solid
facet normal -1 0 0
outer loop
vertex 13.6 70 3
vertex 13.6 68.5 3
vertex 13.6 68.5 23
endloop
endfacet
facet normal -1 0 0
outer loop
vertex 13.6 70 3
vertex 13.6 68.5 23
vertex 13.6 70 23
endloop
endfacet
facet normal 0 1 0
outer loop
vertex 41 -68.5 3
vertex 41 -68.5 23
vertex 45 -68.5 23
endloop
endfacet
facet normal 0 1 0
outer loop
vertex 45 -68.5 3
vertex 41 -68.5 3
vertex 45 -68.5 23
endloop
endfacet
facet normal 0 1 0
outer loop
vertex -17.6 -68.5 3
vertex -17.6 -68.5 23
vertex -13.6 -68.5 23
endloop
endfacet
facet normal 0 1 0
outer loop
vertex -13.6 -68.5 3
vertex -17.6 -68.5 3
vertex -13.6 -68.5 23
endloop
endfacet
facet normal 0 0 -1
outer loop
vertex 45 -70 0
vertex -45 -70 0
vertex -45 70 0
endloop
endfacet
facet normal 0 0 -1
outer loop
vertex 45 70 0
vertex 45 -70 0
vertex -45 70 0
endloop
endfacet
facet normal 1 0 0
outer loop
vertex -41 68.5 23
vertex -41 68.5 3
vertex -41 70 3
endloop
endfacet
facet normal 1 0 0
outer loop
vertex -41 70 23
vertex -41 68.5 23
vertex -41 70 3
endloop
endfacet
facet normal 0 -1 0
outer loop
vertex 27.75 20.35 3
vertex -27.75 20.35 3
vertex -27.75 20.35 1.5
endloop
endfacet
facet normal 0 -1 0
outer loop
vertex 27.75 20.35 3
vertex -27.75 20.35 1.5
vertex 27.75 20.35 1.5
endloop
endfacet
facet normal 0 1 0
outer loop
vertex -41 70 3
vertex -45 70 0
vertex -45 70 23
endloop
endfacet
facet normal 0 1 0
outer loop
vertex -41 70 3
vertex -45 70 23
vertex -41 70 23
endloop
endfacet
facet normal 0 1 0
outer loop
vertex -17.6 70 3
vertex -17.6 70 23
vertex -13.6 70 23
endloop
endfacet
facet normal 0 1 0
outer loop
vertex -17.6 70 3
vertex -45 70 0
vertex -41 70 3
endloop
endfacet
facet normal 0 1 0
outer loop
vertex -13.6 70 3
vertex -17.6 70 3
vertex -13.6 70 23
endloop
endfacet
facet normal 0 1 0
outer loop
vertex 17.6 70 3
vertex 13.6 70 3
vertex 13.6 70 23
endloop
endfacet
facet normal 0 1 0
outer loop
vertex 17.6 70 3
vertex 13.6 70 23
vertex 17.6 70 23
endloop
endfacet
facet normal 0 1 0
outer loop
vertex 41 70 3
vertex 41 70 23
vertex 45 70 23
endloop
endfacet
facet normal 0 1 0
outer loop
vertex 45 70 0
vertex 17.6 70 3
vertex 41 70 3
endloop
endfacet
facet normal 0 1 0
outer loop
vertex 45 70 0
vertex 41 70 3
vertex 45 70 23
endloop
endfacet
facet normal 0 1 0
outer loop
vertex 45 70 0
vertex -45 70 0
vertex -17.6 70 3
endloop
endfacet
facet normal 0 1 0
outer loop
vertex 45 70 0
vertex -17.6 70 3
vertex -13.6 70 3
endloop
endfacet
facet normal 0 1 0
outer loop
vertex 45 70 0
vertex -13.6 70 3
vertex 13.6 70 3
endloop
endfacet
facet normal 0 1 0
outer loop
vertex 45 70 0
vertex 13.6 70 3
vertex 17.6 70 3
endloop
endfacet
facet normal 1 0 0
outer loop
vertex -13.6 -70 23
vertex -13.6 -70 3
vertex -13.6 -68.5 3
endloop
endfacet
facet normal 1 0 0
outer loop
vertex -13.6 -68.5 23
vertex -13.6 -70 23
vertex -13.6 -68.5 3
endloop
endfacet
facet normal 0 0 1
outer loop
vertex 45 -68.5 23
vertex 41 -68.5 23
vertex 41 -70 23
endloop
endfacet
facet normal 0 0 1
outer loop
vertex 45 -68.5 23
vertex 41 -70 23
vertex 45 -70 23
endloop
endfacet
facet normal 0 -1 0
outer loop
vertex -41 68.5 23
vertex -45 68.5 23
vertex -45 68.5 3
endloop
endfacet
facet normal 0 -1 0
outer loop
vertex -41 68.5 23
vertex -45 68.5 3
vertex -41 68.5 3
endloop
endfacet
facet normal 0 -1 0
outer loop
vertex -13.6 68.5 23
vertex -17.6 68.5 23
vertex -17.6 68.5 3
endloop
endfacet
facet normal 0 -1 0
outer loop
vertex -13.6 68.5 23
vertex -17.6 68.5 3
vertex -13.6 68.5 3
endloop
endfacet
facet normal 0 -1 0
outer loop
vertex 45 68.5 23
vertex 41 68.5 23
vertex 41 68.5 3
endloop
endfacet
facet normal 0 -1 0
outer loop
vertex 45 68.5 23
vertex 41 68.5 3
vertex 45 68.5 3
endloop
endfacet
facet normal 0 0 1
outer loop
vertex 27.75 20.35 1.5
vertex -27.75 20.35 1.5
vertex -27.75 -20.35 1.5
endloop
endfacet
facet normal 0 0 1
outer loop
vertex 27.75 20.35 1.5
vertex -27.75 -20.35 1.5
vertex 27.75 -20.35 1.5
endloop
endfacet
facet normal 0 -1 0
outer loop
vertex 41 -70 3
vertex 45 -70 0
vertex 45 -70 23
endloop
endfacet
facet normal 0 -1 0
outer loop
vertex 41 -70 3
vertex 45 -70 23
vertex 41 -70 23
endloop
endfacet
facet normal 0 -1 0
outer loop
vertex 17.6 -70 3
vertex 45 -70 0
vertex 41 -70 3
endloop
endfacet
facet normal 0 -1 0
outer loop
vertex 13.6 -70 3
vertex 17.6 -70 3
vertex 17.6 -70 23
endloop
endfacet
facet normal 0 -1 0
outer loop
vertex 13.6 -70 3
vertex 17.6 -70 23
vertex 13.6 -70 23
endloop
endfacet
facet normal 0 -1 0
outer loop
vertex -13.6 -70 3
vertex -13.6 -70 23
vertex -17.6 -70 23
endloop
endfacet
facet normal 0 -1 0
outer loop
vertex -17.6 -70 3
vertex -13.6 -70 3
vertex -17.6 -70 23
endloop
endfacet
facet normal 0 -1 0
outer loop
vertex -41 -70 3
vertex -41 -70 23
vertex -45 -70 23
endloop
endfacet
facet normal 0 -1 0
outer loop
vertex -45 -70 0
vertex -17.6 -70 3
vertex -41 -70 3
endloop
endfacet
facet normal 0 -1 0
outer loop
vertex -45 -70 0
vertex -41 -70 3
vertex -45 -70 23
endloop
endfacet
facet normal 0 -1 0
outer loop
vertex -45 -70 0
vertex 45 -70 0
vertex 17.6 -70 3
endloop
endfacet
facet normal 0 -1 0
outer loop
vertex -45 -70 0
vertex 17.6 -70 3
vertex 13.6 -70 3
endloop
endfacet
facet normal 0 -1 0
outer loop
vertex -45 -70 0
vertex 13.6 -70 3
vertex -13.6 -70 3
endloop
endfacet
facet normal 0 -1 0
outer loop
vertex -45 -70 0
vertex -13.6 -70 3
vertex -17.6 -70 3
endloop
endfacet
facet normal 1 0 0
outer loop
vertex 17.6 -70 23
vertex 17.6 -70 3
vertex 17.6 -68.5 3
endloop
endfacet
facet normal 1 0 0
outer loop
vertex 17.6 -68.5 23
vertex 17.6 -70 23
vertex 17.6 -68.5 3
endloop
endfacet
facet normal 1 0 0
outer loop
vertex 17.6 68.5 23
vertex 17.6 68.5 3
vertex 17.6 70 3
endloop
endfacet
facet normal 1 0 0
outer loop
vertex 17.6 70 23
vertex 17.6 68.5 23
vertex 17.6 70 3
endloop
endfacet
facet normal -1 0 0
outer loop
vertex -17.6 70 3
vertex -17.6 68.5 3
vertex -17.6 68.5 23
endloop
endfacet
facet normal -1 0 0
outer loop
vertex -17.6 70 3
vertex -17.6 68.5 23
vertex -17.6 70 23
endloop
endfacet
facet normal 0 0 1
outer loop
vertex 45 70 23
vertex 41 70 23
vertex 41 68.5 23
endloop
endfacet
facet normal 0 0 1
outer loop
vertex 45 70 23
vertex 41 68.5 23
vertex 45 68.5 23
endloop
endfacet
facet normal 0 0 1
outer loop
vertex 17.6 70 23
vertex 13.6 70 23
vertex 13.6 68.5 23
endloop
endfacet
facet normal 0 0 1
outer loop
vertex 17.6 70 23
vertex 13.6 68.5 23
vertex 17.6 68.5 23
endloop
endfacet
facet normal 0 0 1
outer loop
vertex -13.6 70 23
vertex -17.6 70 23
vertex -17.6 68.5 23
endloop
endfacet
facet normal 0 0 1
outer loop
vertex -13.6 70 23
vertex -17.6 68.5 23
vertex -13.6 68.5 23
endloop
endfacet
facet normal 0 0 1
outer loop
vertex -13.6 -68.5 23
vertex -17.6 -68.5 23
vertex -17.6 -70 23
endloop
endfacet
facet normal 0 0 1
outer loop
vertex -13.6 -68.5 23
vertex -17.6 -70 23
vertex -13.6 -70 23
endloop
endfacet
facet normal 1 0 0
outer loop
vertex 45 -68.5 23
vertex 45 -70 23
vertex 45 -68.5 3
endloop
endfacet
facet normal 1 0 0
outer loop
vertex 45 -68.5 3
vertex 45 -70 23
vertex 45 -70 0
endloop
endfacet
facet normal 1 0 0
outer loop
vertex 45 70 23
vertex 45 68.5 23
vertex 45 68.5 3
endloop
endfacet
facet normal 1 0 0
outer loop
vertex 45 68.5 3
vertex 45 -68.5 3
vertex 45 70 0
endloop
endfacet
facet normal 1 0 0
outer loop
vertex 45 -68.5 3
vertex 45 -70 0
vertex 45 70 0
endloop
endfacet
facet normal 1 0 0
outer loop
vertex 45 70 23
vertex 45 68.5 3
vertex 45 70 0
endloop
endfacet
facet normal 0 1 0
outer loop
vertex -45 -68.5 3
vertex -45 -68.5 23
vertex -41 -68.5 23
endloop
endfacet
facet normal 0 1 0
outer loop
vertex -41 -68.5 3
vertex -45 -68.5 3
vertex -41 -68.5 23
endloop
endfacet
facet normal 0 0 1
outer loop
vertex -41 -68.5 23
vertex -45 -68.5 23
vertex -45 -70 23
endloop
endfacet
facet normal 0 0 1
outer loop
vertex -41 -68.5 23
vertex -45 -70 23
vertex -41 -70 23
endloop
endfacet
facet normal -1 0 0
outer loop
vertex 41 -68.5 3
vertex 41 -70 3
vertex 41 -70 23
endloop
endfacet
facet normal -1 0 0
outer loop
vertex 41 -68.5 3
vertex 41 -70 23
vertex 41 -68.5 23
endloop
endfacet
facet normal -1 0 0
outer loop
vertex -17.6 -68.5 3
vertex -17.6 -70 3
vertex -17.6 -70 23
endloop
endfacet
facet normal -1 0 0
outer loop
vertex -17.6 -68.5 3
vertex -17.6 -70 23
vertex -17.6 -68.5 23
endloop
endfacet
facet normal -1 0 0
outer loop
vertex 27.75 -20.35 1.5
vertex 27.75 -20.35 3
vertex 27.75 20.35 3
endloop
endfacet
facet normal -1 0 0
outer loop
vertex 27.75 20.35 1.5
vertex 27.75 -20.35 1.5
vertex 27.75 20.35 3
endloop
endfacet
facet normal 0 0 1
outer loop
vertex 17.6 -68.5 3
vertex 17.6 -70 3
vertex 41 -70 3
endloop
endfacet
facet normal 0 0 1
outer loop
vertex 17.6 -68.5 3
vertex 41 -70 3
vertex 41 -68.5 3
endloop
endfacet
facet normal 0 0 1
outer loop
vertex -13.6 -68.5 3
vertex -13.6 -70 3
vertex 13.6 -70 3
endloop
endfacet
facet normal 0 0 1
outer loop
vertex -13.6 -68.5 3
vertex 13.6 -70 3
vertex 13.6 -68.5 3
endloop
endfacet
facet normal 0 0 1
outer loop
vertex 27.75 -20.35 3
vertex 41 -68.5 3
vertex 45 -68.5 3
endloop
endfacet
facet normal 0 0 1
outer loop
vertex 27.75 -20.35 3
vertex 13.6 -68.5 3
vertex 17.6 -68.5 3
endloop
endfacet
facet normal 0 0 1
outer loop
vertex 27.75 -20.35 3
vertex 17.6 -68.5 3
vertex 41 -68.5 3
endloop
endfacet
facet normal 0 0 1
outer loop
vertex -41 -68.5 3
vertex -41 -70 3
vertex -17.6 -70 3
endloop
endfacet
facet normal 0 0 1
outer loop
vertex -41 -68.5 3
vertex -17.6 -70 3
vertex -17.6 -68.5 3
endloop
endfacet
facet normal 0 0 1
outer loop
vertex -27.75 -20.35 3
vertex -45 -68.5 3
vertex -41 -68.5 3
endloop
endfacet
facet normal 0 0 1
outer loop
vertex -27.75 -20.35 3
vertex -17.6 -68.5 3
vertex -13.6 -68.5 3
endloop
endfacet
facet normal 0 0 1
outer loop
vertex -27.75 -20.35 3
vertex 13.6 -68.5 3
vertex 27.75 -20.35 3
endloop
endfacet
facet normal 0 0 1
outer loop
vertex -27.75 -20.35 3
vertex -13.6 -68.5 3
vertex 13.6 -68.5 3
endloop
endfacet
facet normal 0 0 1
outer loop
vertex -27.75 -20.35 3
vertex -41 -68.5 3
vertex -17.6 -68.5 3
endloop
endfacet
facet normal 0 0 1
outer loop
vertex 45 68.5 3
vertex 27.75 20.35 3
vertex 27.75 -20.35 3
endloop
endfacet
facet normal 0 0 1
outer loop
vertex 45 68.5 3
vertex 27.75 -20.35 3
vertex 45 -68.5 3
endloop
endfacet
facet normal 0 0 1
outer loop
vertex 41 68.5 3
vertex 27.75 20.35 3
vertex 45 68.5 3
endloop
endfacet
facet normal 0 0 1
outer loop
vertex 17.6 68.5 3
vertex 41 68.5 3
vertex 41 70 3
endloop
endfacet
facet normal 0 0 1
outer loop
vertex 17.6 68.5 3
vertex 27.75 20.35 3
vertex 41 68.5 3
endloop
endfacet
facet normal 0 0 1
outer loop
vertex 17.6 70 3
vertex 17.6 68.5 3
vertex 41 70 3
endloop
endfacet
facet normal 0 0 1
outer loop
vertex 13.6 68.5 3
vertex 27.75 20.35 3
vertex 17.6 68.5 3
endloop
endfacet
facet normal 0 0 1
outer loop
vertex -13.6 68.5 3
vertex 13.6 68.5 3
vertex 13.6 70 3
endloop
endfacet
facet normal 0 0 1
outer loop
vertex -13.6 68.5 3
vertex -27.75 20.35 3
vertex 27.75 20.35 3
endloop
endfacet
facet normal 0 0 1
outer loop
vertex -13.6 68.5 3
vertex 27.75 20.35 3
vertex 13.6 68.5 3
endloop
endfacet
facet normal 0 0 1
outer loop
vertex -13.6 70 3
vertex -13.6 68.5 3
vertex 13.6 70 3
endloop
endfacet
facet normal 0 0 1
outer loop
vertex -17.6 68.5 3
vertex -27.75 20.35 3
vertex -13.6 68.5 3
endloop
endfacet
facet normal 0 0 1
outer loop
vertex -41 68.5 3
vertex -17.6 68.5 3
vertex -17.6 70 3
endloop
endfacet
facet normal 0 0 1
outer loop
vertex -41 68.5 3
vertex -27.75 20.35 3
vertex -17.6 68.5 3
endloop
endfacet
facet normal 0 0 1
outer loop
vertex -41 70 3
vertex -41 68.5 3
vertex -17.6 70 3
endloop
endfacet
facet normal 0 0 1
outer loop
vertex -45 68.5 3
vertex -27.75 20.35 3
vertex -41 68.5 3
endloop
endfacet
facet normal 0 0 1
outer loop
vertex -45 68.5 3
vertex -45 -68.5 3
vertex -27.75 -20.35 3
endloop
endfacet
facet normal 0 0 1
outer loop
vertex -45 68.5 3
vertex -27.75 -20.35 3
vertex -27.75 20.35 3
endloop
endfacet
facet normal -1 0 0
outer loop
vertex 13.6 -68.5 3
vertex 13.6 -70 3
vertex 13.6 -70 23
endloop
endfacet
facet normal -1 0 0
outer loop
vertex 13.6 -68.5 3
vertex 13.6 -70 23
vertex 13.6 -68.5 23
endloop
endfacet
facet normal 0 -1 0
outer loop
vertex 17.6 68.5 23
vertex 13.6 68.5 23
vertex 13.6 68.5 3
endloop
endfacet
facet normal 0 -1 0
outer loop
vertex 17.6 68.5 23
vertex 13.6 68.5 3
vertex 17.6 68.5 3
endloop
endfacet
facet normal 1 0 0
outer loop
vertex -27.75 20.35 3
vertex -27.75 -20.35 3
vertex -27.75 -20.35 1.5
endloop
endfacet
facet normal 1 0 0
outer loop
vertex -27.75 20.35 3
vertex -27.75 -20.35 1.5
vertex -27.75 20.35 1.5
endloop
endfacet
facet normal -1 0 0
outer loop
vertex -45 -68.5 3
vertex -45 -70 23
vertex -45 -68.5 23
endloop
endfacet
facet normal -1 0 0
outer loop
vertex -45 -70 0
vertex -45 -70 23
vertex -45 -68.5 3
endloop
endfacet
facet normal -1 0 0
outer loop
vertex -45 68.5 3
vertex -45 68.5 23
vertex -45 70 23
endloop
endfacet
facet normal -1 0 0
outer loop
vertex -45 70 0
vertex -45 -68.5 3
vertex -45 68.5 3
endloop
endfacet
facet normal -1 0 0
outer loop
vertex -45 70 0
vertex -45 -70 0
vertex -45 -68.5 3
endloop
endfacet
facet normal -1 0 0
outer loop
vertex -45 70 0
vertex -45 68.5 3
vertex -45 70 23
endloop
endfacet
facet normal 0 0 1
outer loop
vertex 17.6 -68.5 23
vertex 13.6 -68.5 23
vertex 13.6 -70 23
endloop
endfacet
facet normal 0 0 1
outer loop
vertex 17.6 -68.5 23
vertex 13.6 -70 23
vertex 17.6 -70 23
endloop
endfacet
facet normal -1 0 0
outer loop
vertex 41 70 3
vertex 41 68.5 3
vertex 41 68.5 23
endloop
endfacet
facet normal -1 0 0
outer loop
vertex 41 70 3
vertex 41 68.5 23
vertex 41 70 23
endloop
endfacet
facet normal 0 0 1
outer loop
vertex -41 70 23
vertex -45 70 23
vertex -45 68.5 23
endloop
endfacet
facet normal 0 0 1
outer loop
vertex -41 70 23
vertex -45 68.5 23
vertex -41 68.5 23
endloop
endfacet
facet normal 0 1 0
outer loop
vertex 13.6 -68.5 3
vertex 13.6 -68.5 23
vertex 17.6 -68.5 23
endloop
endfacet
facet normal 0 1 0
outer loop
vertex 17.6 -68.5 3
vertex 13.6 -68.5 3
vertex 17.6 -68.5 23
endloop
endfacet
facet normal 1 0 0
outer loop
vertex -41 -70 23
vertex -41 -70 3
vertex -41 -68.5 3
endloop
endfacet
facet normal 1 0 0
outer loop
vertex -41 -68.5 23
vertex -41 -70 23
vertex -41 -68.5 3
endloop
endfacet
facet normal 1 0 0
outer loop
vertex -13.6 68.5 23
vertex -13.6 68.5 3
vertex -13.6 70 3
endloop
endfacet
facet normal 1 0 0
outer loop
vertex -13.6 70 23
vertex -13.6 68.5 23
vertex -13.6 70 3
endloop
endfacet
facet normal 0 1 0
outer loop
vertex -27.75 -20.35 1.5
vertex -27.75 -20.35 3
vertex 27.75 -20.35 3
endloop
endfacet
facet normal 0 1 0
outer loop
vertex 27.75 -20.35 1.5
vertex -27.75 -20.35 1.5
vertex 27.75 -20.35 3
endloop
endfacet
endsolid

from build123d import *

# Parameters (mm, degrees)
SKETCH1_W           = 140
SKETCH1_H           = 90
BOSS_EXTRUDE1_DEPTH = 3
SKETCH2_W           = 4
SKETCH2_H           = 1.5
BOSS_EXTRUDE2_DEPTH = 20
SKETCH4_W           = 55.5
SKETCH4_H           = 40.7
CUT_EXTRUDE1_DEPTH  = 1.5


with BuildPart() as part:
    # Sketch1 → Boss-Extrude1 (new body)
    with BuildSketch(Plane(origin=(0, 0, 0), x_dir=(0, 1, 0), z_dir=(0, 0, 1))):
        Rectangle(SKETCH1_W, SKETCH1_H)
    extrude(amount=BOSS_EXTRUDE1_DEPTH)

    # Sketch2 → Boss-Extrude2 (add)
    with BuildSketch(Plane.XY.offset(3)):
        with Locations((-43, 69.25)):
            Rectangle(SKETCH2_W, SKETCH2_H)
        with Locations((-15.6, 69.25)):
            Rectangle(SKETCH2_W, SKETCH2_H)
        with Locations((15.6, 69.25)):
            Rectangle(SKETCH2_W, SKETCH2_H)
        with Locations((43, 69.25)):
            Rectangle(SKETCH2_W, SKETCH2_H)
        with Locations((-43, -69.25)):
            Rectangle(SKETCH2_W, SKETCH2_H)
        with Locations((-15.6, -69.25)):
            Rectangle(SKETCH2_W, SKETCH2_H)
        with Locations((15.6, -69.25)):
            Rectangle(SKETCH2_W, SKETCH2_H)
        with Locations((43, -69.25)):
            Rectangle(SKETCH2_W, SKETCH2_H)
    extrude(amount=BOSS_EXTRUDE2_DEPTH)

    # Sketch4 → Cut-Extrude1 (cut)
    with BuildSketch(Plane.XY.offset(3)):
        Rectangle(SKETCH4_W, SKETCH4_H)
    extrude(amount=-CUT_EXTRUDE1_DEPTH, mode=Mode.SUBTRACT)


solid = part.part
